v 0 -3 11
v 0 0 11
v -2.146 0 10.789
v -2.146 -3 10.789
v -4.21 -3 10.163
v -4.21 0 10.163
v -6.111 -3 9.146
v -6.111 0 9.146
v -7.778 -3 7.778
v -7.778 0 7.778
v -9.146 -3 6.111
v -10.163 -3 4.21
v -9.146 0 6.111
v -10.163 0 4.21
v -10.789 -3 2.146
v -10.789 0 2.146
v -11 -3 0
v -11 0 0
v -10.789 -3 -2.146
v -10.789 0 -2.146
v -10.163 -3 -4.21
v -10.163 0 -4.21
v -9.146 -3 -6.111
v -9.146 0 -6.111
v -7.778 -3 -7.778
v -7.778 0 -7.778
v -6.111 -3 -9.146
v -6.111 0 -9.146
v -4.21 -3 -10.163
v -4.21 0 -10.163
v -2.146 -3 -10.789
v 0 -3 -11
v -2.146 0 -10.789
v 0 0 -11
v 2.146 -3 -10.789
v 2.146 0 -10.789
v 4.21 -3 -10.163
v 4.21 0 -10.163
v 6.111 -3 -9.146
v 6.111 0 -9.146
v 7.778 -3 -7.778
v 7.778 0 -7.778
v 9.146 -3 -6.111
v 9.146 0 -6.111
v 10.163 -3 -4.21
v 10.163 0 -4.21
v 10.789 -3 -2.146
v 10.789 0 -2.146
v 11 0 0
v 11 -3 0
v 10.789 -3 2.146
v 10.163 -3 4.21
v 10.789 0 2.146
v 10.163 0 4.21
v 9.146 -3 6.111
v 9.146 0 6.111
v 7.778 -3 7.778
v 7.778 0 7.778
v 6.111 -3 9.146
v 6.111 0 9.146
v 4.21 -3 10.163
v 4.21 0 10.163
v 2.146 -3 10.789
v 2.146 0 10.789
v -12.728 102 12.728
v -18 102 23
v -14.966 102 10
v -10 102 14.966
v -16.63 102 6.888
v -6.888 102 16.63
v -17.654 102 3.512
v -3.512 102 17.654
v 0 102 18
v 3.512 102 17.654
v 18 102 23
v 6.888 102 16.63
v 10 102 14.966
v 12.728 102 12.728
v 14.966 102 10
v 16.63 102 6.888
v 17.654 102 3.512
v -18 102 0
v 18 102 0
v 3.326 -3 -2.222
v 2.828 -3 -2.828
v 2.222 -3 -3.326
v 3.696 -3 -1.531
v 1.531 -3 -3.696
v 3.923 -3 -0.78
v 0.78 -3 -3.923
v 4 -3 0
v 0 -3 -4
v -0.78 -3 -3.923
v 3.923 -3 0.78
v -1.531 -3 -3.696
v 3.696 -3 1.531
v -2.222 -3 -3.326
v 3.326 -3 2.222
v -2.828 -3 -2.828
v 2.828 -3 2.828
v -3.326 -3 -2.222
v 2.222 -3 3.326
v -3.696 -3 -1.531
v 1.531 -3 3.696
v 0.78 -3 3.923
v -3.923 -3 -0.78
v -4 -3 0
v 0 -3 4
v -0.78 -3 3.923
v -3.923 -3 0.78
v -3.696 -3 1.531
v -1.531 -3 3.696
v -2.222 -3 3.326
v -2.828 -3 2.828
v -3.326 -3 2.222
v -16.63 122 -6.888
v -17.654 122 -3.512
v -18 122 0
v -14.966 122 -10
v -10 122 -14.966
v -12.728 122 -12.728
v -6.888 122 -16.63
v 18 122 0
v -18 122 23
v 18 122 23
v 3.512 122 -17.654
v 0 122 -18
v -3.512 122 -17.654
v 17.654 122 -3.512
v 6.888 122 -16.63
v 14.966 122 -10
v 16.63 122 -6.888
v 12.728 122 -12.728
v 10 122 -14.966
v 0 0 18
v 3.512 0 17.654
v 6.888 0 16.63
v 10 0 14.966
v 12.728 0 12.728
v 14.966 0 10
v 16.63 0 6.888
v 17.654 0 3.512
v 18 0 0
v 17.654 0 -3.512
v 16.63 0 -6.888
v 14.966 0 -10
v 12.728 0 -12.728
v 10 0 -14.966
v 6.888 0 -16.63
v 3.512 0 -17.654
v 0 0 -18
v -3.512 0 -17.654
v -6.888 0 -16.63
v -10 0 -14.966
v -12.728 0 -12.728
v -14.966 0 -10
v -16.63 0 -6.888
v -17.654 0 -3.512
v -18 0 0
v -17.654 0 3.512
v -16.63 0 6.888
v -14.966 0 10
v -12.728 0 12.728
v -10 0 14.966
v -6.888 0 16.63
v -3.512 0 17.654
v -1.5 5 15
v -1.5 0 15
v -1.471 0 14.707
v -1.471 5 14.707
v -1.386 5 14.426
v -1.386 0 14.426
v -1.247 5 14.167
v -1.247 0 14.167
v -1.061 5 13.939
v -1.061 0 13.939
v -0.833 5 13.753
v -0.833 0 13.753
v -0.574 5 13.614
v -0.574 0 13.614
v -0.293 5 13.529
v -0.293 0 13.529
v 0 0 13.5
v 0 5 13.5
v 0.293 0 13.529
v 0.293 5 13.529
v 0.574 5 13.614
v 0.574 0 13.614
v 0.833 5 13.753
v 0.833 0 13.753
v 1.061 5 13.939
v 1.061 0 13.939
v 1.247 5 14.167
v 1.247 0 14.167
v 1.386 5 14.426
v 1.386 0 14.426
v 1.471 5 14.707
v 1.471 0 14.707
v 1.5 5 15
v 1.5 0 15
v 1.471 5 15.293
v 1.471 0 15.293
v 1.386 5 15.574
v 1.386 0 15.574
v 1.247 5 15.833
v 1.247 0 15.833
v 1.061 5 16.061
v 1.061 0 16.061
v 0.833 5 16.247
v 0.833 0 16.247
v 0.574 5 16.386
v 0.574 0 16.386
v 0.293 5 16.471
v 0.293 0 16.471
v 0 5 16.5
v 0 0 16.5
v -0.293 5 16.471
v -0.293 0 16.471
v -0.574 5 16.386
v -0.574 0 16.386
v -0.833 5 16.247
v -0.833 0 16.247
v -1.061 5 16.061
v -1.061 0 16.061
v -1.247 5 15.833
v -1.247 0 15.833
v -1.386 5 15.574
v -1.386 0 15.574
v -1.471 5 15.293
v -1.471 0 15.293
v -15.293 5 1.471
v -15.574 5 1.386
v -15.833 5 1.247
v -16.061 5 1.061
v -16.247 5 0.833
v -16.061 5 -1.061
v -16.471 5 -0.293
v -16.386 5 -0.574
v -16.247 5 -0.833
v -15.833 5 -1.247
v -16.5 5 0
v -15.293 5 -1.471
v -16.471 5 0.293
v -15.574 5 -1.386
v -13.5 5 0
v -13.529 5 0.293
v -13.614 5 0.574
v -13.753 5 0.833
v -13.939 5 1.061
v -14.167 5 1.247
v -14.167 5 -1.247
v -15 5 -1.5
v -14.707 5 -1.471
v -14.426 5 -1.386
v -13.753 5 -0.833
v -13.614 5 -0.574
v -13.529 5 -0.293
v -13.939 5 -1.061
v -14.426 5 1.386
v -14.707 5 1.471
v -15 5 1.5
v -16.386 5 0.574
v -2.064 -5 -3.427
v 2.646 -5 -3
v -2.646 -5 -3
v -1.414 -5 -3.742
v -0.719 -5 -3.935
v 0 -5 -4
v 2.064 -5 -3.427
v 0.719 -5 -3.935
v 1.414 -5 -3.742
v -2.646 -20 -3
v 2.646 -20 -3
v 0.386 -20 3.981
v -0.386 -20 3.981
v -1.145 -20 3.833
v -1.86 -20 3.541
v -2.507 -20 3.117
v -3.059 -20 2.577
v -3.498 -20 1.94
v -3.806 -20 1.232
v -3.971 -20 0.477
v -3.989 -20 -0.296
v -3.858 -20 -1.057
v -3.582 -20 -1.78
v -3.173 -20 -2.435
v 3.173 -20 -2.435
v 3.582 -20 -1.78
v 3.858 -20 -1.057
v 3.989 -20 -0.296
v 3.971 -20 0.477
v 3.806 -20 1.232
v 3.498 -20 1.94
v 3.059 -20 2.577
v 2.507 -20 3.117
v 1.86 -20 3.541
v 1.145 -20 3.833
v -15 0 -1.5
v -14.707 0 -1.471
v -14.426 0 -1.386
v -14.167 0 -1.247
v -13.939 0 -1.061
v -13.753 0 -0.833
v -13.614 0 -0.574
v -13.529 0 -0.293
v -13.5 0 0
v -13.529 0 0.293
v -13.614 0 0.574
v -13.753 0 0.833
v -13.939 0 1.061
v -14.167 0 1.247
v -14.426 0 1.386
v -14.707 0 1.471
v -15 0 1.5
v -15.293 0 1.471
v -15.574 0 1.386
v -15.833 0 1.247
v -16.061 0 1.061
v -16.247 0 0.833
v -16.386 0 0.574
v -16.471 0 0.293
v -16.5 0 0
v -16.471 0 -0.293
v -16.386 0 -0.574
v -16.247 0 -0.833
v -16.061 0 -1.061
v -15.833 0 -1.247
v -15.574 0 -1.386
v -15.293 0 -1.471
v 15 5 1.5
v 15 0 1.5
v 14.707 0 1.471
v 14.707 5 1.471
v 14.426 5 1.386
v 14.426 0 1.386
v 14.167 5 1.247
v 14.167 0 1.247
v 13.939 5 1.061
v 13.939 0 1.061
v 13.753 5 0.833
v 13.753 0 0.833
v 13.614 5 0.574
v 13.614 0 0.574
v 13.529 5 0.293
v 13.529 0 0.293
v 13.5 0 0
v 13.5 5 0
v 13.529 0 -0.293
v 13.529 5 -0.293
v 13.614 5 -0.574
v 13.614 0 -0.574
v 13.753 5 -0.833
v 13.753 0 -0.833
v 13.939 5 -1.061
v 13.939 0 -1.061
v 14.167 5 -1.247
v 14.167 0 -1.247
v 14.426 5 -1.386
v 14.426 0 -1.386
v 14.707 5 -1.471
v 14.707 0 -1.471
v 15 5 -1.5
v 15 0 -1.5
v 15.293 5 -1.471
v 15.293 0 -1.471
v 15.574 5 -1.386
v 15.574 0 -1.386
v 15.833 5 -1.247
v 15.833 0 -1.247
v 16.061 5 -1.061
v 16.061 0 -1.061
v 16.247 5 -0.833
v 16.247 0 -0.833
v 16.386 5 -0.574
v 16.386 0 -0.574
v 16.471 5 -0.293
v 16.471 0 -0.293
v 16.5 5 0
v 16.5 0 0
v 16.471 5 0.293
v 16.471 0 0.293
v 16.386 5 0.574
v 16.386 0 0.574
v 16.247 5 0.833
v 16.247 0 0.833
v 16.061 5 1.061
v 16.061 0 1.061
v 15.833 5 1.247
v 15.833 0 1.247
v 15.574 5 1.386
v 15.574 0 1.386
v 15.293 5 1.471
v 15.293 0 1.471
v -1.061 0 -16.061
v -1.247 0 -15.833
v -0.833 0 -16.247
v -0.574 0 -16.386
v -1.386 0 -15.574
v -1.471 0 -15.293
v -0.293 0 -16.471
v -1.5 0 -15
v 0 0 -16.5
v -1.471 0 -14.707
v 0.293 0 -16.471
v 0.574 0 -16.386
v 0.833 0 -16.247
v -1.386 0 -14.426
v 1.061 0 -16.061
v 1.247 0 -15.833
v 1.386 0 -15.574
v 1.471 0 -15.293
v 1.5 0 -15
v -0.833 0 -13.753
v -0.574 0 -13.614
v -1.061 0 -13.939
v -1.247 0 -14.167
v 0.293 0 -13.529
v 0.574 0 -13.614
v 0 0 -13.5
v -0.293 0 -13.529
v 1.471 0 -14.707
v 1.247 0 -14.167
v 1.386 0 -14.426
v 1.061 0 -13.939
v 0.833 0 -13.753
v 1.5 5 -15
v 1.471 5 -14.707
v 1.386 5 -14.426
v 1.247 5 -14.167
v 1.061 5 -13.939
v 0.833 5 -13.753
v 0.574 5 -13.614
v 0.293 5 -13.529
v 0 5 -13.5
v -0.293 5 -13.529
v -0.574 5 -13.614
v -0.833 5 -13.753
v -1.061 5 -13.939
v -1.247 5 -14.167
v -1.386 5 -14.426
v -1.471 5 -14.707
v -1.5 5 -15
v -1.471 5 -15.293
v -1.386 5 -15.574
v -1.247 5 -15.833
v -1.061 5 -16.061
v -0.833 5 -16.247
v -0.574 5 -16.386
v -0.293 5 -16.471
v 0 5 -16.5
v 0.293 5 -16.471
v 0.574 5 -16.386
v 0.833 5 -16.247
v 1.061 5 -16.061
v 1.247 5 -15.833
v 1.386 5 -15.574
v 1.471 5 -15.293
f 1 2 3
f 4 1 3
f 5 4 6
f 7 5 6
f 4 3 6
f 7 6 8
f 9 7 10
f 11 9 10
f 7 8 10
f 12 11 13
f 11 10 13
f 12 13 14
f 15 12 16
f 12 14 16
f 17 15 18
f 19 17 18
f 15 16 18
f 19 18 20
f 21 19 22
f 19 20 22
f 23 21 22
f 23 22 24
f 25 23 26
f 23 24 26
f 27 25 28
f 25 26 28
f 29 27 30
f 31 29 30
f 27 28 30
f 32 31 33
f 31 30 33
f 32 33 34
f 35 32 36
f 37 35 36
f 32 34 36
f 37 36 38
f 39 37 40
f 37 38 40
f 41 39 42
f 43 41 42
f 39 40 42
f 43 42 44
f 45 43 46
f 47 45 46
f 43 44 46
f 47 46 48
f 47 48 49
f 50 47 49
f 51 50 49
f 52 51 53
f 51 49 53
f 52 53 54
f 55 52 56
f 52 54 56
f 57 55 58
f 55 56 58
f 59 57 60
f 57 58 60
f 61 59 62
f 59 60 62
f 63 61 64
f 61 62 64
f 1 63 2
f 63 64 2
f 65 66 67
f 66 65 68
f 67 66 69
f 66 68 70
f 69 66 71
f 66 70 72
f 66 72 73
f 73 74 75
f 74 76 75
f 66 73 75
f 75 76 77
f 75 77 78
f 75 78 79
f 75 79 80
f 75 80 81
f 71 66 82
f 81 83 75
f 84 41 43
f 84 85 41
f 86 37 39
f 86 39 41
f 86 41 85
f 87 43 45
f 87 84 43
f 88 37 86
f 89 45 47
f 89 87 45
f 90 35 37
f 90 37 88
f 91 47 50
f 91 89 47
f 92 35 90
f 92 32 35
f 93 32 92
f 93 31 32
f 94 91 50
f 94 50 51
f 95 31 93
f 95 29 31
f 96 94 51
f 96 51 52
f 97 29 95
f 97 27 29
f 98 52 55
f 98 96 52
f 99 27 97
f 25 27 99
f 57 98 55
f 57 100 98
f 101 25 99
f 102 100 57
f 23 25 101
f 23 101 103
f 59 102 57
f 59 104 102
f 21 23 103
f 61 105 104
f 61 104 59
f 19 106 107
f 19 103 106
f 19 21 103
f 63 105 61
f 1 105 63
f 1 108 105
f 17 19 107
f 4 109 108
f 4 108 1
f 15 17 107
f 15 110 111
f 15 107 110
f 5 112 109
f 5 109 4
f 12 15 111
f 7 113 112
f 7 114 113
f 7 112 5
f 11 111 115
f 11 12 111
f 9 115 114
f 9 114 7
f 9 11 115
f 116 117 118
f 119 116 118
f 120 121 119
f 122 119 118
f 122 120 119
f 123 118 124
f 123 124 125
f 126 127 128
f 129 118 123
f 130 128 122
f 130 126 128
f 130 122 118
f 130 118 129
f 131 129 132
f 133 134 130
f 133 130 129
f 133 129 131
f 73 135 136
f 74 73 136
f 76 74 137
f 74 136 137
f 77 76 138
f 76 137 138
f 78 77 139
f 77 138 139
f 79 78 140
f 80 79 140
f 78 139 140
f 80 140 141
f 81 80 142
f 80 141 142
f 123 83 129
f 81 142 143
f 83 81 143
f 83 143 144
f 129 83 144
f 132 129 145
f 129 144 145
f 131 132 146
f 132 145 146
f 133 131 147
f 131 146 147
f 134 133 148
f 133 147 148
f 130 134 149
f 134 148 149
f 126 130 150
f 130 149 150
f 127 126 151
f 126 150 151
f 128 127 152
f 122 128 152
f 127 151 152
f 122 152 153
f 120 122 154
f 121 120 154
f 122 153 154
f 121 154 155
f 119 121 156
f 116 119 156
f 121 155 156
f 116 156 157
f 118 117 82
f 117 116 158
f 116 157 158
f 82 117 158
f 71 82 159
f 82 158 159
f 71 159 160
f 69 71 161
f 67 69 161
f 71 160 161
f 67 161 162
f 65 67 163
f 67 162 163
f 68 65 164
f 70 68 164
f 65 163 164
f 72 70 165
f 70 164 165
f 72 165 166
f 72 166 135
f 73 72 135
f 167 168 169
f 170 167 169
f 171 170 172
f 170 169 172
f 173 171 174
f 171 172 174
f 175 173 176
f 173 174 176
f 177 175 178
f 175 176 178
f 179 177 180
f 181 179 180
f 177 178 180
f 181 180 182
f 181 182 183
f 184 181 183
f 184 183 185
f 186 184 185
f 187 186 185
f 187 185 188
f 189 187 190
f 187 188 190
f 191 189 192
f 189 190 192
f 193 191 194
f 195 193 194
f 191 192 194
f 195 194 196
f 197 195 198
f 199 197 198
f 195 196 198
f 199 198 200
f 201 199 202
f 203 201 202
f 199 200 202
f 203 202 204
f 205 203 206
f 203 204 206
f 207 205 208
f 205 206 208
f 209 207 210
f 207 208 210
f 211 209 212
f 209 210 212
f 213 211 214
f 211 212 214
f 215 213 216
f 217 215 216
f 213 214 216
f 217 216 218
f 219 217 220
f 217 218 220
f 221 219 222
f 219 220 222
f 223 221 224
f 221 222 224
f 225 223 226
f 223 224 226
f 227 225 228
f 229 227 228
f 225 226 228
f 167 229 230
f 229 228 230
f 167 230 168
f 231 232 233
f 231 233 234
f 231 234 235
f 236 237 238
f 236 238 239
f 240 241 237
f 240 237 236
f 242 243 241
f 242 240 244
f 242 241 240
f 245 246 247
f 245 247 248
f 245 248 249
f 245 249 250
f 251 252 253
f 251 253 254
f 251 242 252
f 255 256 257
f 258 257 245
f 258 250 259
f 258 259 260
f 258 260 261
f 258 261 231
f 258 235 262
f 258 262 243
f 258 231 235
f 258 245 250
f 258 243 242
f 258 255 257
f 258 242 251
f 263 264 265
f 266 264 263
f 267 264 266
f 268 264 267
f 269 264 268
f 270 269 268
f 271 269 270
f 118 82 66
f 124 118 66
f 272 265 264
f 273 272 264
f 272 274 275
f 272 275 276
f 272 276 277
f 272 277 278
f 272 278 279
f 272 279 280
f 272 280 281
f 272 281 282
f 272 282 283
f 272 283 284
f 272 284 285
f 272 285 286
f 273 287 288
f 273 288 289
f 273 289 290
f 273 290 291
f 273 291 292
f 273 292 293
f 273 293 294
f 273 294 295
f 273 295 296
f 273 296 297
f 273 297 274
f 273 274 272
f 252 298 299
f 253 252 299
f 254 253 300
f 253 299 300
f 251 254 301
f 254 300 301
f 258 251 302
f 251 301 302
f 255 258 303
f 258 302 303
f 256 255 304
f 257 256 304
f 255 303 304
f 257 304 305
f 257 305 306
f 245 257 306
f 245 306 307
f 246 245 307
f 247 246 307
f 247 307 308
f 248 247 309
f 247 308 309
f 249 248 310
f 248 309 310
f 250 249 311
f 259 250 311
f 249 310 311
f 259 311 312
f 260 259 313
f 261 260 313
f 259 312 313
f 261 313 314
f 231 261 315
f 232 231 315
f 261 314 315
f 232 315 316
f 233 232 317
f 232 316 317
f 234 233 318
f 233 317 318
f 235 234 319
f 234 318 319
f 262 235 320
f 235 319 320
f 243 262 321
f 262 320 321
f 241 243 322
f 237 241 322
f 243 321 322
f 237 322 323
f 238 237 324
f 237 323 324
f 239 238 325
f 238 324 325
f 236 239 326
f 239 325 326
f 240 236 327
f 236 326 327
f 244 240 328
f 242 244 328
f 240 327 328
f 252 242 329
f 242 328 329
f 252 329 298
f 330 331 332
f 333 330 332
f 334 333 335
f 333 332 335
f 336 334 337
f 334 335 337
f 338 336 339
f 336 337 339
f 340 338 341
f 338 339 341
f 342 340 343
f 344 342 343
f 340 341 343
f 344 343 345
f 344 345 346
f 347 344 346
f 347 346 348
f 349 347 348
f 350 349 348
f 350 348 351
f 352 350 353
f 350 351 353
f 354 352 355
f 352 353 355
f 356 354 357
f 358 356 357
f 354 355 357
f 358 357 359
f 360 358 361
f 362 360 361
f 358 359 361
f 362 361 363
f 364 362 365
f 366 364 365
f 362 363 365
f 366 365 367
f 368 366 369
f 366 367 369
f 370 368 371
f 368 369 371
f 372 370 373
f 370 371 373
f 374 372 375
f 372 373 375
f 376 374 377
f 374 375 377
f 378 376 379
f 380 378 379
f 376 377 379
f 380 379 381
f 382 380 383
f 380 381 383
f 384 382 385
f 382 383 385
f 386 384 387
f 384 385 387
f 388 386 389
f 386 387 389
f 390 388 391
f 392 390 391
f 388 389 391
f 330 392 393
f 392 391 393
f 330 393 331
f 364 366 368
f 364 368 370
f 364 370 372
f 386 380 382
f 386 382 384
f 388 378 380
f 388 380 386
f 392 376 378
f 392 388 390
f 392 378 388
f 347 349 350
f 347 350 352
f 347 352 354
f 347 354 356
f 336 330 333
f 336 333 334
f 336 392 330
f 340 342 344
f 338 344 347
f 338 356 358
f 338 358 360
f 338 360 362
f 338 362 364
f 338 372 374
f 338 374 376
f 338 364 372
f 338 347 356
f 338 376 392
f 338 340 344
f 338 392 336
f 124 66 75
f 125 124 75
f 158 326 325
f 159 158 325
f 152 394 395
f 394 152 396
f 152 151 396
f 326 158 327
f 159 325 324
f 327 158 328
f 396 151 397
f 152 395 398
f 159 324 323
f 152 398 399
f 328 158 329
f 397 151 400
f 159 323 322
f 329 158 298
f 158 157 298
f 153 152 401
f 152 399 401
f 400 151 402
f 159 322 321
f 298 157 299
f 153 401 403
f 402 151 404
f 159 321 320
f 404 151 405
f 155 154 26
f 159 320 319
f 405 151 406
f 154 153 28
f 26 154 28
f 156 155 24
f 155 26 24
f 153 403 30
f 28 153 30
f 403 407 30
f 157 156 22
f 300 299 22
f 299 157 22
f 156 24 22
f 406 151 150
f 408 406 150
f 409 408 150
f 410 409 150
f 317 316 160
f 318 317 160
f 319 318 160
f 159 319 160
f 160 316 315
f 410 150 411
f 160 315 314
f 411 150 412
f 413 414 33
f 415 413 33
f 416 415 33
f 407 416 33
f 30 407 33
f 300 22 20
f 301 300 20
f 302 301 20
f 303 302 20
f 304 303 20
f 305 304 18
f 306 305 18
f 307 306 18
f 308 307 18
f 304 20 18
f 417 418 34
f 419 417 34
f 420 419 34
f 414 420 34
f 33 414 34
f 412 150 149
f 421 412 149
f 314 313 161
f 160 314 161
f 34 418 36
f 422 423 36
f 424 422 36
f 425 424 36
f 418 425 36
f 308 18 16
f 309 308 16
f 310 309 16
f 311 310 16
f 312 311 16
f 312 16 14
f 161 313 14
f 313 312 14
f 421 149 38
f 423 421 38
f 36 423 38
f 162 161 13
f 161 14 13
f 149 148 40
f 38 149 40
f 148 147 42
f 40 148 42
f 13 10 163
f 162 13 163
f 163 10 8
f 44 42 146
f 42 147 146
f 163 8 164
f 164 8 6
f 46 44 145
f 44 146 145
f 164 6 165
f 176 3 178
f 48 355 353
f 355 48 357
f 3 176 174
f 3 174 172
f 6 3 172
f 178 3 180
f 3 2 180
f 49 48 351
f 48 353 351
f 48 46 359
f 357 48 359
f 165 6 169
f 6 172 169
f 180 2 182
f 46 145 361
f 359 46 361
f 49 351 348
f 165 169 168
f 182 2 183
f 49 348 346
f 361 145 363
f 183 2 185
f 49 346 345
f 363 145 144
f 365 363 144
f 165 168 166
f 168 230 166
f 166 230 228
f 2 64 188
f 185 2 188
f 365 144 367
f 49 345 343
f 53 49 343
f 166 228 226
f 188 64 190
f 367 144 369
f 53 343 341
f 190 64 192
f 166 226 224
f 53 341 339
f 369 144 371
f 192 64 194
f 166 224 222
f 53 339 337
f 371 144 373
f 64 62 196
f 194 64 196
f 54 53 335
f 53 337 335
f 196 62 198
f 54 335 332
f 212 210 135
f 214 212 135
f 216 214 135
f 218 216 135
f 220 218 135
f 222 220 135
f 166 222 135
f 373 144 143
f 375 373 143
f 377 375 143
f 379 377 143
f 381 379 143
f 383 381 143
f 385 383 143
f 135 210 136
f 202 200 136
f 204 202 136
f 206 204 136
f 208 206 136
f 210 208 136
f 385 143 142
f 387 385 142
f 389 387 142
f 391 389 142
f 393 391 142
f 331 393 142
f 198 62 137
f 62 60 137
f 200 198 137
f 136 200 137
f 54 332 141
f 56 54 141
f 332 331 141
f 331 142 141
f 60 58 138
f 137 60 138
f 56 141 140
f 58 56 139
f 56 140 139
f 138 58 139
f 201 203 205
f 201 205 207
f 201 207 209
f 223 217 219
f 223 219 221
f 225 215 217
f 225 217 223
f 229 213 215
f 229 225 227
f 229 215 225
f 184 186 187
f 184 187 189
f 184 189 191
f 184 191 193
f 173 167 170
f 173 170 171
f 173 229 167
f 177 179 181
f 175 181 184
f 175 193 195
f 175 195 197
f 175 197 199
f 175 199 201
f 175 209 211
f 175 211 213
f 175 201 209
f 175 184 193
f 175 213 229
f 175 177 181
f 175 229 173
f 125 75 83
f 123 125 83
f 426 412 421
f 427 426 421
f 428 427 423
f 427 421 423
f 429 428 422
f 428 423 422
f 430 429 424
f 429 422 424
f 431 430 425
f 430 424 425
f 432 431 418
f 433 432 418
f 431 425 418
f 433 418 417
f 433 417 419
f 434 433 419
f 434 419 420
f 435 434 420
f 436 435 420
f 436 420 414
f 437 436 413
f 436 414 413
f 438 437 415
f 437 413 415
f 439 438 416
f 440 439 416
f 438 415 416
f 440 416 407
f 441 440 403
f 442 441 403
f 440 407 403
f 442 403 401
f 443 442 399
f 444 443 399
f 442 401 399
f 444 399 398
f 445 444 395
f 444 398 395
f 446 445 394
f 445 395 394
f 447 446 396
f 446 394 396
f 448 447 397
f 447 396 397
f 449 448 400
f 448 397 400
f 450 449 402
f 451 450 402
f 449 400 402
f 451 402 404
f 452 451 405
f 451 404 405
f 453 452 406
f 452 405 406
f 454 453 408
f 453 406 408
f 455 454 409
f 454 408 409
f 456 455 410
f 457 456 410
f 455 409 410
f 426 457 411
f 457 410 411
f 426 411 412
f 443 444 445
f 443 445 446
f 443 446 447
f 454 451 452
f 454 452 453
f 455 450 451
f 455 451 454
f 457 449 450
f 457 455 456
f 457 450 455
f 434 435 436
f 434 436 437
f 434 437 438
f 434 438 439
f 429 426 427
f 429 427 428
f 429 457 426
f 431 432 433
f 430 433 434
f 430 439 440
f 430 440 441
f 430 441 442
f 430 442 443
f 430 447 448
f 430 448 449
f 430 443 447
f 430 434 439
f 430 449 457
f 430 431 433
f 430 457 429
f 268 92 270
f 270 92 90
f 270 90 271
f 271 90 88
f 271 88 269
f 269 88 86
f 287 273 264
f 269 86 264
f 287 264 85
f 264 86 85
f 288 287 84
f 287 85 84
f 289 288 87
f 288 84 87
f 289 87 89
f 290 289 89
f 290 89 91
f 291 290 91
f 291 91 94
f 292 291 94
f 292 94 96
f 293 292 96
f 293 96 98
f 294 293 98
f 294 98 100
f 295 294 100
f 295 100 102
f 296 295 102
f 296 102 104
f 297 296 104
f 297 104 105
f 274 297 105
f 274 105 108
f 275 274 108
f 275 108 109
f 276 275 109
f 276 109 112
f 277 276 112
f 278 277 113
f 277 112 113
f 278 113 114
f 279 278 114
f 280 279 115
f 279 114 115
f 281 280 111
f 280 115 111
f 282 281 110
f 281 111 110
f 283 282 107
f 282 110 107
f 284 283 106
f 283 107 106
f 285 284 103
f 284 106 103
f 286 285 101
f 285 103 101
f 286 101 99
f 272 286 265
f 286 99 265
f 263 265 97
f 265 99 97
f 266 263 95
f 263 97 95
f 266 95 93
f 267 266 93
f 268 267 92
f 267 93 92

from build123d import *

# Parameters (mm, degrees)
SKETCH1_R           = 18
BOSS_EXTRUDE1_DEPTH = 102
SKETCH2_R           = 1.5
CUT_EXTRUDE1_DEPTH  = 5
CIRPATTERN1_COUNT   = 4
SKETCH3_R           = 11
BOSS_EXTRUDE2_DEPTH = 3
SKETCH4_R           = 4
BOSS_EXTRUDE3_DEPTH = 17
CUT_EXTRUDE2_START  = -15
CUT_EXTRUDE2_DEPTH  = 15
BOSS_EXTRUDE4_DEPTH = 20


with BuildPart() as part:
    # Sketch1 → Boss-Extrude1 (new body)
    with BuildSketch(Plane(origin=(0, 0, 0), x_dir=(1, 0, 0), z_dir=(0, 1, 0))):
        with Locations(Location((0, 0, 0), (0, 0, 270))):
            Circle(SKETCH1_R)
    extrude(amount=BOSS_EXTRUDE1_DEPTH)

    # Sketch2 → Cut-Extrude1 (cut)
    with BuildSketch(Plane.XZ):
        with Locations(Location((-15, 0, 0), (0, 0, 270))):
            Circle(SKETCH2_R)
    cut_extrude1 = extrude(amount=-CUT_EXTRUDE1_DEPTH, mode=Mode.SUBTRACT)

    # CirPattern1: Cut-Extrude1 ×4 about axis
    cirpattern1_axis = Axis((0, 0, 0), (0, 1, 0))
    for i in range(1, CIRPATTERN1_COUNT):
        add(cut_extrude1.rotate(cirpattern1_axis, i * 360 / CIRPATTERN1_COUNT), mode=Mode.SUBTRACT)

    # Sketch3 → Boss-Extrude2 (add)
    with BuildSketch(Plane.XZ):
        with Locations(Location((0, 0, 0), (0, 0, 90))):
            Circle(SKETCH3_R)
    extrude(amount=BOSS_EXTRUDE2_DEPTH)

    # Sketch4 → Boss-Extrude3 (add)
    with BuildSketch(Plane.XZ.offset(3)):
        with Locations(Location((0, 0, 0), (0, 0, 270))):
            Circle(SKETCH4_R)
    extrude(amount=BOSS_EXTRUDE3_DEPTH)

    # Sketch5 → Cut-Extrude2 (cut)
    with BuildSketch(Plane.XZ.offset(20).offset(CUT_EXTRUDE2_START)):
        with BuildLine():
            Line((-2.645751311, -3), (2.645751311, -3))
            ThreePointArc((2.645751311, -3), (0, -4), (-2.645751311, -3))
        make_face()
    extrude(amount=CUT_EXTRUDE2_DEPTH, mode=Mode.SUBTRACT)

    # Sketch7 → Boss-Extrude4 (add)
    with BuildSketch(Plane(origin=(0, 102, 0), x_dir=(1, 0, 0), z_dir=(0, 1, 0))):
        with BuildLine():
            Line((-18, 0), (-18, -23))
            Line((-18, -23), (18, -23))
            Line((18, -23), (18, 0))
            ThreePointArc((18, 0), (0, 18), (-18, 0))
        make_face()
    extrude(amount=BOSS_EXTRUDE4_DEPTH)


solid = part.part
